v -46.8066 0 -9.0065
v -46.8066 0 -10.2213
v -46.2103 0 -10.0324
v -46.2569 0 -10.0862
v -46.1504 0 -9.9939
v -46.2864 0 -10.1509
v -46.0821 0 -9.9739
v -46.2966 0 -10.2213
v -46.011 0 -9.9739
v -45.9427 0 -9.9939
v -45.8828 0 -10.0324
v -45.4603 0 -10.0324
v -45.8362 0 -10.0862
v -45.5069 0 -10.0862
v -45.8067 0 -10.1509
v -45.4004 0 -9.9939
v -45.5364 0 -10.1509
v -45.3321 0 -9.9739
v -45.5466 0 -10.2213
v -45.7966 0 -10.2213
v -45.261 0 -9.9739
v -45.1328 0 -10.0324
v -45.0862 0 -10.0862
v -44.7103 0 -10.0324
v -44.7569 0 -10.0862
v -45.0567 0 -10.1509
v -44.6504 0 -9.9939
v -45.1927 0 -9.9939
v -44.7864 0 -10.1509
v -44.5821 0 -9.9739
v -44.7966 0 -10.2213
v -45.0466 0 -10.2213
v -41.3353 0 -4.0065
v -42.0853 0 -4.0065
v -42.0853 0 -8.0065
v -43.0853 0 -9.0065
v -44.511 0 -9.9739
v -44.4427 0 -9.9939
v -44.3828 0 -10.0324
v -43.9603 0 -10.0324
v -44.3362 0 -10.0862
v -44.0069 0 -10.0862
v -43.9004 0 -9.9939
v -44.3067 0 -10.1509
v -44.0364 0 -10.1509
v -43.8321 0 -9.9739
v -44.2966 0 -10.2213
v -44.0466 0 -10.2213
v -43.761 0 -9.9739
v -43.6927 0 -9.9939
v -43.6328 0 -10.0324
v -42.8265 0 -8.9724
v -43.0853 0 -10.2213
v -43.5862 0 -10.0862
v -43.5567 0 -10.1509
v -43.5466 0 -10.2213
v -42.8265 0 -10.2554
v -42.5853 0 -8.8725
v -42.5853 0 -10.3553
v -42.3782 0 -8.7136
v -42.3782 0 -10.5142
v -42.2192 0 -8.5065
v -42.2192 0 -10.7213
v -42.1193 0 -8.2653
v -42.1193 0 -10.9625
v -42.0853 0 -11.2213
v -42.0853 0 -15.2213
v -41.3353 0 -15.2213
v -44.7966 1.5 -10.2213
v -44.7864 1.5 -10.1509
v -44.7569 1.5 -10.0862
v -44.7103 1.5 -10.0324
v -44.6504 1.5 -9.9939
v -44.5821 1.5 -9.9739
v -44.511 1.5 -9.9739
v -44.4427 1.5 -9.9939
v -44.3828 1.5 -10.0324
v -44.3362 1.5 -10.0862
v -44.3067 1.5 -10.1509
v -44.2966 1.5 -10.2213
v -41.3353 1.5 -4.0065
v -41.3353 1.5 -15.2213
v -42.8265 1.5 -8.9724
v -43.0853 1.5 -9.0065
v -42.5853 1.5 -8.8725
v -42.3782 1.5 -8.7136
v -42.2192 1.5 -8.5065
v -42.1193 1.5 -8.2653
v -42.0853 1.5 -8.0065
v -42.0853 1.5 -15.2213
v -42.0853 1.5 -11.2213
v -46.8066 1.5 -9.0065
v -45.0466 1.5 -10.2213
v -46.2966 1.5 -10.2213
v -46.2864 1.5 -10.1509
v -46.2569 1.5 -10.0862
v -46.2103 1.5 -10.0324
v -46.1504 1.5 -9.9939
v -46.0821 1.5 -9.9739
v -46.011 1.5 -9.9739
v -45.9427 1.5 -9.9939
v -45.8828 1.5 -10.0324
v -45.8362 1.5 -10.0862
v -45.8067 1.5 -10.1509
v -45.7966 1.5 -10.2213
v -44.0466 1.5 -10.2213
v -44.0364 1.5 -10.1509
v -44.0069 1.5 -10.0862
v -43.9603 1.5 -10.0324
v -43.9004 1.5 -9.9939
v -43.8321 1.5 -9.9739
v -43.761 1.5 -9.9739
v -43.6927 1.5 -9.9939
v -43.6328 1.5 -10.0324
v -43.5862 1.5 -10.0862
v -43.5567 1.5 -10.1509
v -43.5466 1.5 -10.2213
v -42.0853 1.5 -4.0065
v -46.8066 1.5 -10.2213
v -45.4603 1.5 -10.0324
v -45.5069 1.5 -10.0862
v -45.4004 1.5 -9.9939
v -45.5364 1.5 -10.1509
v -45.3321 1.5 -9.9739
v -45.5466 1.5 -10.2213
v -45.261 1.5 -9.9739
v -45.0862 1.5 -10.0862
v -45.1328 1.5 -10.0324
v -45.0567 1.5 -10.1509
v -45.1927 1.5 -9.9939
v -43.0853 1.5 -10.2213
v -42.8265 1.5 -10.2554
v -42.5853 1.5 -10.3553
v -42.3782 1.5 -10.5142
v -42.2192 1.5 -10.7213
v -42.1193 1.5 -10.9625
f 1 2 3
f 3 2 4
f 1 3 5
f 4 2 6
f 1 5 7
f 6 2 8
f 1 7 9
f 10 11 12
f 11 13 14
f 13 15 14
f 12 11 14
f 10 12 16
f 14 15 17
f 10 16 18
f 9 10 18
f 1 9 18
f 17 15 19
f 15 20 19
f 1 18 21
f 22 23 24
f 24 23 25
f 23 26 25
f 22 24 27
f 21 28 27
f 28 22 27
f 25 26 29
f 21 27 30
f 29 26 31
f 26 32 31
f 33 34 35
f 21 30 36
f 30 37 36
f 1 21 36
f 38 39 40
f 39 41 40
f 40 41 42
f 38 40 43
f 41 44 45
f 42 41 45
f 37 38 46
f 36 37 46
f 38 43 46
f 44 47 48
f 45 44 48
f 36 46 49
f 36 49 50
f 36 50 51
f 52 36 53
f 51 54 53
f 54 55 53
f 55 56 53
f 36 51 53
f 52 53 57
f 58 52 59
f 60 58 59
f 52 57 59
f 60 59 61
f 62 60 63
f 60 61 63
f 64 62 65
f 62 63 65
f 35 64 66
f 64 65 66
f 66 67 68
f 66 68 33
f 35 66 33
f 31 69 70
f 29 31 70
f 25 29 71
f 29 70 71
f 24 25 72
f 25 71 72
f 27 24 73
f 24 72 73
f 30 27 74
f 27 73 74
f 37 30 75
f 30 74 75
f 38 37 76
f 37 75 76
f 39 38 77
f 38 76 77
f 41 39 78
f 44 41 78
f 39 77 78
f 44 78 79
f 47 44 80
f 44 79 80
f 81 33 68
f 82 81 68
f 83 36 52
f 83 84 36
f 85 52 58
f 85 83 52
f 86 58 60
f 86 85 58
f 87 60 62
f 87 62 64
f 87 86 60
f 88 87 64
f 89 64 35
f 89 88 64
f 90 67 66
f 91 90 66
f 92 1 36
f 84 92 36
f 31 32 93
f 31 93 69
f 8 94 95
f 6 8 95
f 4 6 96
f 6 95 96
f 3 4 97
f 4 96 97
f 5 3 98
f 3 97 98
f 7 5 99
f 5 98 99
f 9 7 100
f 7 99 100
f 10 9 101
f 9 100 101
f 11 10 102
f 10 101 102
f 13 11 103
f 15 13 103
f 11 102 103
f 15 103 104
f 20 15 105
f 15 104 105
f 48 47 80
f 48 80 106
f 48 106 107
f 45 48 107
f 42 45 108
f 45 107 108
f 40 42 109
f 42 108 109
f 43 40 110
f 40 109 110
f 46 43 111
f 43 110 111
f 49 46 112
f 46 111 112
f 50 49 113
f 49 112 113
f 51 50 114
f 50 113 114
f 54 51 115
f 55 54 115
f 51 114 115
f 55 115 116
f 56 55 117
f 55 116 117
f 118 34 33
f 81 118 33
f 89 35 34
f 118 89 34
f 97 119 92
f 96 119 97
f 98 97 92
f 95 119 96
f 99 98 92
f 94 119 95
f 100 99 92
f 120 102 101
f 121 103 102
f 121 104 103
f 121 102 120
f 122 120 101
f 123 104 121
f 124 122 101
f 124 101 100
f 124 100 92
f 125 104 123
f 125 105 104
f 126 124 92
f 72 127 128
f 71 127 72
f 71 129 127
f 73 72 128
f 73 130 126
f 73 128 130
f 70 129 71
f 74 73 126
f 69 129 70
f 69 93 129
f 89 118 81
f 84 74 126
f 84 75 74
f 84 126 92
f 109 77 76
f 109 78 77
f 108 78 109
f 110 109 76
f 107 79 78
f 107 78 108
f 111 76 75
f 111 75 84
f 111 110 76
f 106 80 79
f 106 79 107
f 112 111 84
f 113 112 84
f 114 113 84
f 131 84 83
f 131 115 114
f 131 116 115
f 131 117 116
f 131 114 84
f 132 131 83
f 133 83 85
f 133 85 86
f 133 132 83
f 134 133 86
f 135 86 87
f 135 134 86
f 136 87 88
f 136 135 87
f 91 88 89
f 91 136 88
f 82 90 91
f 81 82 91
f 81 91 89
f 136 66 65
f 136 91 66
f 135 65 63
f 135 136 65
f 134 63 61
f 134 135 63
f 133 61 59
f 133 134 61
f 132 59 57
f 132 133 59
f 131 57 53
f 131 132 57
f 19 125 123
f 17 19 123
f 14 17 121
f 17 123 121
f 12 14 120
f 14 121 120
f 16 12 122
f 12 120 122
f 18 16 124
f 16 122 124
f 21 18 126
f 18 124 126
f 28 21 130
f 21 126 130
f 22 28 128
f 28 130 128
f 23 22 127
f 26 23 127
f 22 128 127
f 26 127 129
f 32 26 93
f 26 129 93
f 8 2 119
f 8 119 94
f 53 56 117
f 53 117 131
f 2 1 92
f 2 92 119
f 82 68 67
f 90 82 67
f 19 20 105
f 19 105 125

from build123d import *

# Parameters (mm, degrees)
SKETCH1_W           = 4.721281475
SKETCH1_H           = 1.214825
BOSS_EXTRUDE1_DEPTH = 1.5
FILLET1_R           = 1
FILLET2_R           = 1
CUT_EXTRUDE1_DEPTH  = 2
LPATTERN1_COUNT     = 4
LPATTERN1_PITCH     = 0.75


with BuildPart() as part:
    # Sketch1 → Boss-Extrude1 (new body)
    with BuildSketch(Plane(origin=(0, 0, 0), x_dir=(1, 0, 0), z_dir=(0, 1, 0))):
        Polygon((-42.085271319, 4.006512849), (-41.335271319, 4.006512849), (-41.335271319, 15.221337849), (-42.085271319, 15.221337849), (-42.085271319, 10.221337849), (-42.085271319, 9.006512849), align=None)
        with Locations((-44.445912057, 9.613925349)):
            Rectangle(SKETCH1_W, SKETCH1_H)
    extrude(amount=BOSS_EXTRUDE1_DEPTH)

    # Fillet1
    fillet1_edges = [part.edges().sort_by_distance(p)[0] for p in [
        (-42.085271319, 0.75, -10.221337849),
    ]]
    fillet(fillet1_edges, radius=FILLET1_R)

    # Fillet2
    fillet2_edges = [part.edges().sort_by_distance(p)[0] for p in [
        (-42.085271319, 0.75, -9.006512849),
    ]]
    fillet(fillet2_edges, radius=FILLET2_R)

    # Sketch2 → Cut-Extrude1 (cut)
    with BuildSketch(Plane(origin=(0, 1.5, 0), x_dir=(1, 0, 0), z_dir=(0, 1, 0))):
        with BuildLine():
            ThreePointArc((-45.796552794, 10.221337849), (-46.046552794, 10.471337849), (-46.296552794, 10.221337849))
            Line((-46.296552794, 10.221337849), (-46.046552794, 10.221337849))
            Line((-46.046552794, 10.221337849), (-45.796552794, 10.221337849))
        make_face()
        with BuildLine():
            Line((-46.046552794, 10.221337849), (-46.296552794, 10.221337849))
            ThreePointArc((-46.296552794, 10.221337849), (-46.046552794, 9.971337849), (-45.796552794, 10.221337849))
            Line((-45.796552794, 10.221337849), (-46.046552794, 10.221337849))
        make_face()
    cut_extrude1 = extrude(amount=-CUT_EXTRUDE1_DEPTH, mode=Mode.SUBTRACT)

    # LPattern1: Cut-Extrude1 ×4
    with Locations(*[(i * LPATTERN1_PITCH, 0, 0) for i in range(1, LPATTERN1_COUNT)]):
        add(cut_extrude1, mode=Mode.SUBTRACT)


solid = part.part
